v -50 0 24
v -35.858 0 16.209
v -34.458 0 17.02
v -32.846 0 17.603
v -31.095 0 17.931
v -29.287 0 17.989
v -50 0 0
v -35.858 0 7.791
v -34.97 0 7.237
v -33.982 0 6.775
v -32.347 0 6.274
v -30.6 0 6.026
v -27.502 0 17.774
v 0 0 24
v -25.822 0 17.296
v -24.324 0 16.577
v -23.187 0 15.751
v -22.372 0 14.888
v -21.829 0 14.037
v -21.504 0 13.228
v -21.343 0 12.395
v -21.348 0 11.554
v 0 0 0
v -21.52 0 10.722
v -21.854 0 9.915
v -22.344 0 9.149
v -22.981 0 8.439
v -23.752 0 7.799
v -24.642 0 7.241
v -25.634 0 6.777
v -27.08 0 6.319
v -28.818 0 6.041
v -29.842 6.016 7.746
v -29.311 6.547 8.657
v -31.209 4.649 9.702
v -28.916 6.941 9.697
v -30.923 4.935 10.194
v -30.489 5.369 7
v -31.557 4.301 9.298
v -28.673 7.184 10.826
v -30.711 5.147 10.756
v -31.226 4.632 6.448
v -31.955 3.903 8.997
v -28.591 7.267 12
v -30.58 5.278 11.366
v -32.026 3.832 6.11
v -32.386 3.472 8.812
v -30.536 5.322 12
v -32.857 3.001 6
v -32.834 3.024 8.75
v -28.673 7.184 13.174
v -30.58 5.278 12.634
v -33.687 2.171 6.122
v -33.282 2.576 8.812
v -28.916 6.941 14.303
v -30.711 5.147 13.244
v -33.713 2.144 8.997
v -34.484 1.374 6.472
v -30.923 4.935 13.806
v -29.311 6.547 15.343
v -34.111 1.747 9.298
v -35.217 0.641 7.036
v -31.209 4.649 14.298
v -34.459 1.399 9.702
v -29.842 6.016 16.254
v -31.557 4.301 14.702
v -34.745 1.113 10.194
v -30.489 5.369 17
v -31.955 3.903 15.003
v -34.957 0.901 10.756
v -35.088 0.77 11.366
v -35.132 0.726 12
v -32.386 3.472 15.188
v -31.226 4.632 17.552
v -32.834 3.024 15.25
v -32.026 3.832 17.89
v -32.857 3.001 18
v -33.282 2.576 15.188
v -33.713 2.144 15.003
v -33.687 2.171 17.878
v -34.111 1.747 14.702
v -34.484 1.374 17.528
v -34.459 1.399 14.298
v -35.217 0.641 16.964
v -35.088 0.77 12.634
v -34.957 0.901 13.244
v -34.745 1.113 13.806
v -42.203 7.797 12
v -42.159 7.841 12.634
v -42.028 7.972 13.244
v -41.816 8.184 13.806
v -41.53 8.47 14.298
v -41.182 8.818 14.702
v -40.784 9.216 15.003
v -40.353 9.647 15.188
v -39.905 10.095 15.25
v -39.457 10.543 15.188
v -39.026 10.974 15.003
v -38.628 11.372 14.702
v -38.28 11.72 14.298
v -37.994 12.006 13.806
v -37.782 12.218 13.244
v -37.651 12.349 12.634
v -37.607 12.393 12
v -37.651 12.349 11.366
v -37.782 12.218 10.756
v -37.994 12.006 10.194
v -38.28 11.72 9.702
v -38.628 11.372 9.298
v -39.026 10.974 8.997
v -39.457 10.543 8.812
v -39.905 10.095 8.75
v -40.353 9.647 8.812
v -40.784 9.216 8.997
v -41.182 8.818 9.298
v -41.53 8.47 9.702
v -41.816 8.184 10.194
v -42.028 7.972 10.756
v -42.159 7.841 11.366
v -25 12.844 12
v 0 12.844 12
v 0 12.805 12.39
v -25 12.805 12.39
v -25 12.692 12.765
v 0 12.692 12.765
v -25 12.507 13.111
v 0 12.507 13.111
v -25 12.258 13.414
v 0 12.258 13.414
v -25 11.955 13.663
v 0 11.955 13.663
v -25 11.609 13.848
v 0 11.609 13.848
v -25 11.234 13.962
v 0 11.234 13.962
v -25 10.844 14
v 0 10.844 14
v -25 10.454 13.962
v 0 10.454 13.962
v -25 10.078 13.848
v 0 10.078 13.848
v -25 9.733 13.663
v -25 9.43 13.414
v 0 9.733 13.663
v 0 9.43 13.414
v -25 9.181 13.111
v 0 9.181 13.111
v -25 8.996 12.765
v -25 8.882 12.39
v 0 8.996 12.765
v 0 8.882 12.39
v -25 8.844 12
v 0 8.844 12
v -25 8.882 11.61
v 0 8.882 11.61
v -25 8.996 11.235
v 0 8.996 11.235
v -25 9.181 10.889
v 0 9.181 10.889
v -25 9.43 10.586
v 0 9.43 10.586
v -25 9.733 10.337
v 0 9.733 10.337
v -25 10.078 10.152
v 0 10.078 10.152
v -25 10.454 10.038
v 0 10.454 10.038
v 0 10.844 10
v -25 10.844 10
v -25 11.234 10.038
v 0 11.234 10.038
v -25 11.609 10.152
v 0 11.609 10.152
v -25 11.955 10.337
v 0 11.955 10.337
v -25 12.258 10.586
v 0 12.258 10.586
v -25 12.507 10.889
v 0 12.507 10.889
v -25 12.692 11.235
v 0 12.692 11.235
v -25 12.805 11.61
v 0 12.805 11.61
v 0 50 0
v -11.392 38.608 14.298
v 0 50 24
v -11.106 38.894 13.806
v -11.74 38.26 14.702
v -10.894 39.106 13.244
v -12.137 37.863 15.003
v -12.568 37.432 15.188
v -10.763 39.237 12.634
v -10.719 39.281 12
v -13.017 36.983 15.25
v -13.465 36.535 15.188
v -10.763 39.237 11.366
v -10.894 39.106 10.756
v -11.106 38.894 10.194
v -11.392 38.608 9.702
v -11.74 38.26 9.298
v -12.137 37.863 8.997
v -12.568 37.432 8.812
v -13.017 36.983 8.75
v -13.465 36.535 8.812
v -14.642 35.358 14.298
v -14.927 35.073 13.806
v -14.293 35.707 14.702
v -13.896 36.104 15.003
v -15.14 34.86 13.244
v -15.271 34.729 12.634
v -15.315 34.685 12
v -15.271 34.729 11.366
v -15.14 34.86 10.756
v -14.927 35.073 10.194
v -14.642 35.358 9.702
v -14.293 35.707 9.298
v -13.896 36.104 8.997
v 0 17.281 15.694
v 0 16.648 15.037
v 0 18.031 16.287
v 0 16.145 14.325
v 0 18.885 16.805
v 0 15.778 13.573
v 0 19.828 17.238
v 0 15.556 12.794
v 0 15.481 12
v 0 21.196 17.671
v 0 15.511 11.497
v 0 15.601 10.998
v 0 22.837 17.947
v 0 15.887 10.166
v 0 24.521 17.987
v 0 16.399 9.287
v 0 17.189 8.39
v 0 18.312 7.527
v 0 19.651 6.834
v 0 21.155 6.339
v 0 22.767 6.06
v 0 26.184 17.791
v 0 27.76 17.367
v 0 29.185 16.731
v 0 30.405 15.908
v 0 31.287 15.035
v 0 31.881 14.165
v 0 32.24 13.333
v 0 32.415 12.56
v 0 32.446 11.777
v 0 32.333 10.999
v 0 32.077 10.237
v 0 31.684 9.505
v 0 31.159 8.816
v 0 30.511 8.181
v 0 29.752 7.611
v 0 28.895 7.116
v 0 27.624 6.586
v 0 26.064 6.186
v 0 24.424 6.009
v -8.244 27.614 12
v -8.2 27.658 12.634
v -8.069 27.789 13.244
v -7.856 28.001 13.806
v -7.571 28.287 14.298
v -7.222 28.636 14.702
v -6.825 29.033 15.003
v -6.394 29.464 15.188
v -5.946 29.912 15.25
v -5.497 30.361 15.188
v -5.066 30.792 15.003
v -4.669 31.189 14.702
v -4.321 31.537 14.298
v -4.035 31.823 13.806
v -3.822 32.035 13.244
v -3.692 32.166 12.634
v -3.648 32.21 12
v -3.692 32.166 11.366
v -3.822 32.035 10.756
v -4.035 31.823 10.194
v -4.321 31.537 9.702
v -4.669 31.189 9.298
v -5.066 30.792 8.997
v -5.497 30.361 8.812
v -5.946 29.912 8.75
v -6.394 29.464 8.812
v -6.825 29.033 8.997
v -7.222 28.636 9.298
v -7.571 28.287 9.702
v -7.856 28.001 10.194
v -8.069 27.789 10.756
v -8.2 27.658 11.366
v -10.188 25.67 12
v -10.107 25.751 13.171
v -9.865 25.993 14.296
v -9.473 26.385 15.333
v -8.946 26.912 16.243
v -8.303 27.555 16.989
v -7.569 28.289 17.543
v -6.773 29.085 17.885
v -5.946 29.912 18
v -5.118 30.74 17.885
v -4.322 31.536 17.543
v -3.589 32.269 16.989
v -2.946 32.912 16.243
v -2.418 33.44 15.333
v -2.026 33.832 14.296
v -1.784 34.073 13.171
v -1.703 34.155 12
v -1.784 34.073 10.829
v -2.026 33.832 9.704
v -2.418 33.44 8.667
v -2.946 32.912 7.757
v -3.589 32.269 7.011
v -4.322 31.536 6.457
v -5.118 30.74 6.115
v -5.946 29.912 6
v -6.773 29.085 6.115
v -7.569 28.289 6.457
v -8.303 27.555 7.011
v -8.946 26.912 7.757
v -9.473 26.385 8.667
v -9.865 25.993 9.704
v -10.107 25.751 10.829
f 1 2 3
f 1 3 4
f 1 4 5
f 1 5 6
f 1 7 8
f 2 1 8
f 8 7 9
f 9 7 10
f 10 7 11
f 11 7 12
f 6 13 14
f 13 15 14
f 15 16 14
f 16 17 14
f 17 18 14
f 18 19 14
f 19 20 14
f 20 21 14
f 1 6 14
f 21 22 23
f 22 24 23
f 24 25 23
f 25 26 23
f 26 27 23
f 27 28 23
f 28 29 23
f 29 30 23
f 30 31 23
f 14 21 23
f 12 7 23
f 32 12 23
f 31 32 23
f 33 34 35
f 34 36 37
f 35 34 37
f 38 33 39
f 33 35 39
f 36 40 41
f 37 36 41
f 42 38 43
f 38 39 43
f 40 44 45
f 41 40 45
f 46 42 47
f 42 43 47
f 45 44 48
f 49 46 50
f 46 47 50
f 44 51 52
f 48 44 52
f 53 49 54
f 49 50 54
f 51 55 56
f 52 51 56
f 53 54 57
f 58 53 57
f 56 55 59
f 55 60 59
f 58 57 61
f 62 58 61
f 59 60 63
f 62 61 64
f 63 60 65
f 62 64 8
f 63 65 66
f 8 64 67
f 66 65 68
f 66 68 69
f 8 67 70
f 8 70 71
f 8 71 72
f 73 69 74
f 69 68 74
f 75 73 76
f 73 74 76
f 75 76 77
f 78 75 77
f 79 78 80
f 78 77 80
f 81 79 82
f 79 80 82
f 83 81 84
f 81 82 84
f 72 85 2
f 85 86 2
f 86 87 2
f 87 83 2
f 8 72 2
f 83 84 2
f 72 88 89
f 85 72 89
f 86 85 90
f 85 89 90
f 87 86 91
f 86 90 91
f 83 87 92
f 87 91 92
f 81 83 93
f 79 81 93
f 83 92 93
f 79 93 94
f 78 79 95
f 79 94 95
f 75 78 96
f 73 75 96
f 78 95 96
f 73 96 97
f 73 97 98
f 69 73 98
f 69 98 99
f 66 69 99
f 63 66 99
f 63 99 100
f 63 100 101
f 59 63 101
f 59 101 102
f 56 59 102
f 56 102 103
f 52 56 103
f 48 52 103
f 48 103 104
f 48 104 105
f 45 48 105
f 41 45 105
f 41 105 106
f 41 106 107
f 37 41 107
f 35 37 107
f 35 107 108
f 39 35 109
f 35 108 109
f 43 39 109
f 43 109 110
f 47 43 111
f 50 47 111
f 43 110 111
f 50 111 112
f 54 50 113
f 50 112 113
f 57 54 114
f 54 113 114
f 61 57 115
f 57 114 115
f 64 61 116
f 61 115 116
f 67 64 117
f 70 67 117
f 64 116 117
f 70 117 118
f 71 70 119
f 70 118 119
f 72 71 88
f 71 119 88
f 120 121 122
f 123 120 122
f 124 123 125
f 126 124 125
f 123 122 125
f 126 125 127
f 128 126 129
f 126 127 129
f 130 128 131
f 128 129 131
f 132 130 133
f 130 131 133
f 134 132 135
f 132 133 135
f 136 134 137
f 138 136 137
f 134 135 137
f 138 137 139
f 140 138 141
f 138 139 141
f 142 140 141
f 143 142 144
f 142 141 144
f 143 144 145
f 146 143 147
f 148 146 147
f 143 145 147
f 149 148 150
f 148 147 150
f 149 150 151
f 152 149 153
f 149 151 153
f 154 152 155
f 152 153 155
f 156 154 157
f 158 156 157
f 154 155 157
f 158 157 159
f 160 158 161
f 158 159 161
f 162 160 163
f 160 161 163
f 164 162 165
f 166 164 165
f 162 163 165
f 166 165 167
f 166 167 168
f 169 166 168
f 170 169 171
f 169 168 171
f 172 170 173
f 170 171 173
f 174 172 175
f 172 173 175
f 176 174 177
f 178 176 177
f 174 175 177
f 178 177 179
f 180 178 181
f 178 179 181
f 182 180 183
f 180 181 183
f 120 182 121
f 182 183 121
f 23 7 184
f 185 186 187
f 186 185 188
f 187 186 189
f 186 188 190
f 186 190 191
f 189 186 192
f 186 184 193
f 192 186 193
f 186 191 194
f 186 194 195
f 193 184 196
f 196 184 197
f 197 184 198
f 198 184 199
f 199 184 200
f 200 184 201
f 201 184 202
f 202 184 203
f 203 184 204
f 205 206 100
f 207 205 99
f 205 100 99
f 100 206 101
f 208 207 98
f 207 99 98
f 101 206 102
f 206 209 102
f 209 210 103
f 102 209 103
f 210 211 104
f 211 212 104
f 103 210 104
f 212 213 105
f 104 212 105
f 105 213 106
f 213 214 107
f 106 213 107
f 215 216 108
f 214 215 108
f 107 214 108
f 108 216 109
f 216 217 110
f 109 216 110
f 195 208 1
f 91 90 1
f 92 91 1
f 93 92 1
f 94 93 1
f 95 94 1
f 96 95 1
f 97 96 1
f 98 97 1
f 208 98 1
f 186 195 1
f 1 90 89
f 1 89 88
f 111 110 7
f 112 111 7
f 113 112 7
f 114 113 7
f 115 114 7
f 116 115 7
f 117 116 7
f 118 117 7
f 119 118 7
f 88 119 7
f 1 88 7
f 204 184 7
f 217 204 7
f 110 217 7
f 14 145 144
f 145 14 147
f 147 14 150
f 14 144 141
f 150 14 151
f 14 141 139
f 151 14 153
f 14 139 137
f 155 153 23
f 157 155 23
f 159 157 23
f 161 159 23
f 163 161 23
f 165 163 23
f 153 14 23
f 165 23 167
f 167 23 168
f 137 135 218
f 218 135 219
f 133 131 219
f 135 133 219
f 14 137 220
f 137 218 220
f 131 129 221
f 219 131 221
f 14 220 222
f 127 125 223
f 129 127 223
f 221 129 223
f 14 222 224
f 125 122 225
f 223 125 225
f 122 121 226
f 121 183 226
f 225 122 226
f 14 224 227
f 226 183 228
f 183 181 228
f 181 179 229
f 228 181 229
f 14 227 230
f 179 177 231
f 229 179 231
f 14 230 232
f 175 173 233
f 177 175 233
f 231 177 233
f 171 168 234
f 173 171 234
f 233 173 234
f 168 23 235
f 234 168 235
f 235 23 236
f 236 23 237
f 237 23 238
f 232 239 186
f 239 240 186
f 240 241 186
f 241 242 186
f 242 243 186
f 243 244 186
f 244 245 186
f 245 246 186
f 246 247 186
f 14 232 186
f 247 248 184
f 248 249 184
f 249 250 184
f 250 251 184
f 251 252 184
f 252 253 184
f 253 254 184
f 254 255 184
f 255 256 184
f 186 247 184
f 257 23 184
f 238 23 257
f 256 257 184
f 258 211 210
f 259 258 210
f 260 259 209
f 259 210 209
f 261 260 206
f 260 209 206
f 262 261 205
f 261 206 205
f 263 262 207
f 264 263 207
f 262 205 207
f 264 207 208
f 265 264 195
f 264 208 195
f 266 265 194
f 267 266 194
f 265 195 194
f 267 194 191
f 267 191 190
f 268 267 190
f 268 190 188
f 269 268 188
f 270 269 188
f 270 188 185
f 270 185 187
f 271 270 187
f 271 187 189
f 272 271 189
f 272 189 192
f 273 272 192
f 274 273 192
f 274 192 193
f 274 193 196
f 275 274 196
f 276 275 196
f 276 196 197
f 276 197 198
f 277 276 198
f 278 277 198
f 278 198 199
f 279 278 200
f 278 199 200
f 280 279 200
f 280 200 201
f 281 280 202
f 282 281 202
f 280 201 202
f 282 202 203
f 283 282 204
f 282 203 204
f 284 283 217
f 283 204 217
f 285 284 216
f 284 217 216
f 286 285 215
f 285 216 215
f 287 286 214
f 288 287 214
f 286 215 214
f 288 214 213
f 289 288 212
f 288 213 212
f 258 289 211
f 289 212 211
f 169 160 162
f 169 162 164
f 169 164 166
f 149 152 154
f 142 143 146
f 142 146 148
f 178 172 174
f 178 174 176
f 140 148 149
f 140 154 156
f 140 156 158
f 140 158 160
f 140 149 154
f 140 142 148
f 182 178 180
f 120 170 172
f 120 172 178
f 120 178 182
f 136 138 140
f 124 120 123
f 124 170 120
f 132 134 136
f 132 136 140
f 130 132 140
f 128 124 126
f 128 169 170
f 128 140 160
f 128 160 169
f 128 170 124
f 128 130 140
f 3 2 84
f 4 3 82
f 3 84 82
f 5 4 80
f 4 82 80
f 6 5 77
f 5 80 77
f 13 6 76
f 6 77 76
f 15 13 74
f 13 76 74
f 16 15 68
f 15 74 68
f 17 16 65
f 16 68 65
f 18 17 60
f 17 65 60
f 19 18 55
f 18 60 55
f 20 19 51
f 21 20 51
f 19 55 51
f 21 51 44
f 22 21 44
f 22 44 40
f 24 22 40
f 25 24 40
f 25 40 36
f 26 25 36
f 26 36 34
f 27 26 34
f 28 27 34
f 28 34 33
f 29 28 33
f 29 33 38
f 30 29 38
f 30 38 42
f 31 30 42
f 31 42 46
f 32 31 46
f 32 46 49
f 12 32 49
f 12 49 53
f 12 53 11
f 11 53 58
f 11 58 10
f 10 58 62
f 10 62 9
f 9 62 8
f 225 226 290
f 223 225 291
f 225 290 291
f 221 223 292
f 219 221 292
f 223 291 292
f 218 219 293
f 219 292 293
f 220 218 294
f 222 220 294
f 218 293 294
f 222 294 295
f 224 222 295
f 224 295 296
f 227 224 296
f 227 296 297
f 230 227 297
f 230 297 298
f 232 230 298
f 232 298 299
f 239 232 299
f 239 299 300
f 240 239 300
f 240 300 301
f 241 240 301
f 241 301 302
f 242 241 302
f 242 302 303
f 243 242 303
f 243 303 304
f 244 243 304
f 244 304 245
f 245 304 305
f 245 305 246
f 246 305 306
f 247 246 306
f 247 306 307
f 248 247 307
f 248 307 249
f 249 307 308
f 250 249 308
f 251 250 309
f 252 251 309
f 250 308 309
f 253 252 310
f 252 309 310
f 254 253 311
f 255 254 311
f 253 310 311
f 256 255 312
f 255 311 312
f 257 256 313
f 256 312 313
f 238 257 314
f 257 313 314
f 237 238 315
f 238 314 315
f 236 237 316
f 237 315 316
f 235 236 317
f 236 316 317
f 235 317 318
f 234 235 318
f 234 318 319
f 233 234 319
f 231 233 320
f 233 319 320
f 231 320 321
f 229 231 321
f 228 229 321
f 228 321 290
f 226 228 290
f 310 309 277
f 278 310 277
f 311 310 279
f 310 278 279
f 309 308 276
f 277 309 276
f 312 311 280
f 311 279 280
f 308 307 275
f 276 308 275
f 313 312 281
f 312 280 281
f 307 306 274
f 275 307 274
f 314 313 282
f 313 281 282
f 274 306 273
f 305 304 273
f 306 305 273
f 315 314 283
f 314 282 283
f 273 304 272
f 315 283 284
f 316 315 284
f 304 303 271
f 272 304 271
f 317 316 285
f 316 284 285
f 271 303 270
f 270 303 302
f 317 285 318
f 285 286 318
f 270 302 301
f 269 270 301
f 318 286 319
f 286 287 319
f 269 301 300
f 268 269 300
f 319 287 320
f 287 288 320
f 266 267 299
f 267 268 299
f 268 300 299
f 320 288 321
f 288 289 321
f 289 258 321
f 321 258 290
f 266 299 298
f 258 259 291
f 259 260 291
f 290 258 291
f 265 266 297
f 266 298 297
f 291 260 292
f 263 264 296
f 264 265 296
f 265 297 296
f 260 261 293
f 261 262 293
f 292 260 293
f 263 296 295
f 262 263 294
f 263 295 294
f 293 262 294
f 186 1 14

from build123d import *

# Parameters (mm, degrees)
F1_DEPTH = 24
F2_R     = 3.25
F3_DEPTH = 25
F4_START = -10
F2_R_2   = 6
F4_DEPTH = 15
F5_R     = 2
F6_DEPTH = 25


with BuildPart() as f1:
    # F0 (on Top) → F1 (new body)
    with BuildSketch(Plane.XY):
        Polygon((-50, 0), (0, 0), (0, 50), align=None)
    extrude(amount=F1_DEPTH)

    # F2 (on face) → F3 (cut)
    with BuildSketch(Plane(origin=(-25, 25, 0), x_dir=(-0.7071067812, -0.7071067812, 0), z_dir=(-0.7071067812, 0.7071067812, 0))):
        with Locations((-16.9469900429, 12)):
            Circle(F2_R)
        with Locations((21.0788715631, 12)):
            Circle(F2_R)
    extrude(amount=-F3_DEPTH, mode=Mode.SUBTRACT)

    # F2 (on face) → F4 (cut)
    with BuildSketch(Plane(origin=(-25, 25, 0), x_dir=(-0.7071067812, -0.7071067812, 0), z_dir=(-0.7071067812, 0.7071067812, 0)).offset(F4_START)):
        with Locations((21.0788715631, 12)):
            Circle(F2_R_2)
        with Locations((21.0788715631, 12)):
            Circle(F2_R, mode=Mode.SUBTRACT)
        with Locations((-16.9469900429, 12)):
            Circle(F2_R_2)
        with Locations((-16.9469900429, 12)):
            Circle(F2_R, mode=Mode.SUBTRACT)
    extrude(amount=-F4_DEPTH, mode=Mode.SUBTRACT)

    # F5 (on face) → F6 (cut)
    with BuildSketch(Plane.YZ):
        with Locations((10.8437594026, 12)):
            Circle(F5_R)
    extrude(amount=-F6_DEPTH, mode=Mode.SUBTRACT)


solid = f1.part
